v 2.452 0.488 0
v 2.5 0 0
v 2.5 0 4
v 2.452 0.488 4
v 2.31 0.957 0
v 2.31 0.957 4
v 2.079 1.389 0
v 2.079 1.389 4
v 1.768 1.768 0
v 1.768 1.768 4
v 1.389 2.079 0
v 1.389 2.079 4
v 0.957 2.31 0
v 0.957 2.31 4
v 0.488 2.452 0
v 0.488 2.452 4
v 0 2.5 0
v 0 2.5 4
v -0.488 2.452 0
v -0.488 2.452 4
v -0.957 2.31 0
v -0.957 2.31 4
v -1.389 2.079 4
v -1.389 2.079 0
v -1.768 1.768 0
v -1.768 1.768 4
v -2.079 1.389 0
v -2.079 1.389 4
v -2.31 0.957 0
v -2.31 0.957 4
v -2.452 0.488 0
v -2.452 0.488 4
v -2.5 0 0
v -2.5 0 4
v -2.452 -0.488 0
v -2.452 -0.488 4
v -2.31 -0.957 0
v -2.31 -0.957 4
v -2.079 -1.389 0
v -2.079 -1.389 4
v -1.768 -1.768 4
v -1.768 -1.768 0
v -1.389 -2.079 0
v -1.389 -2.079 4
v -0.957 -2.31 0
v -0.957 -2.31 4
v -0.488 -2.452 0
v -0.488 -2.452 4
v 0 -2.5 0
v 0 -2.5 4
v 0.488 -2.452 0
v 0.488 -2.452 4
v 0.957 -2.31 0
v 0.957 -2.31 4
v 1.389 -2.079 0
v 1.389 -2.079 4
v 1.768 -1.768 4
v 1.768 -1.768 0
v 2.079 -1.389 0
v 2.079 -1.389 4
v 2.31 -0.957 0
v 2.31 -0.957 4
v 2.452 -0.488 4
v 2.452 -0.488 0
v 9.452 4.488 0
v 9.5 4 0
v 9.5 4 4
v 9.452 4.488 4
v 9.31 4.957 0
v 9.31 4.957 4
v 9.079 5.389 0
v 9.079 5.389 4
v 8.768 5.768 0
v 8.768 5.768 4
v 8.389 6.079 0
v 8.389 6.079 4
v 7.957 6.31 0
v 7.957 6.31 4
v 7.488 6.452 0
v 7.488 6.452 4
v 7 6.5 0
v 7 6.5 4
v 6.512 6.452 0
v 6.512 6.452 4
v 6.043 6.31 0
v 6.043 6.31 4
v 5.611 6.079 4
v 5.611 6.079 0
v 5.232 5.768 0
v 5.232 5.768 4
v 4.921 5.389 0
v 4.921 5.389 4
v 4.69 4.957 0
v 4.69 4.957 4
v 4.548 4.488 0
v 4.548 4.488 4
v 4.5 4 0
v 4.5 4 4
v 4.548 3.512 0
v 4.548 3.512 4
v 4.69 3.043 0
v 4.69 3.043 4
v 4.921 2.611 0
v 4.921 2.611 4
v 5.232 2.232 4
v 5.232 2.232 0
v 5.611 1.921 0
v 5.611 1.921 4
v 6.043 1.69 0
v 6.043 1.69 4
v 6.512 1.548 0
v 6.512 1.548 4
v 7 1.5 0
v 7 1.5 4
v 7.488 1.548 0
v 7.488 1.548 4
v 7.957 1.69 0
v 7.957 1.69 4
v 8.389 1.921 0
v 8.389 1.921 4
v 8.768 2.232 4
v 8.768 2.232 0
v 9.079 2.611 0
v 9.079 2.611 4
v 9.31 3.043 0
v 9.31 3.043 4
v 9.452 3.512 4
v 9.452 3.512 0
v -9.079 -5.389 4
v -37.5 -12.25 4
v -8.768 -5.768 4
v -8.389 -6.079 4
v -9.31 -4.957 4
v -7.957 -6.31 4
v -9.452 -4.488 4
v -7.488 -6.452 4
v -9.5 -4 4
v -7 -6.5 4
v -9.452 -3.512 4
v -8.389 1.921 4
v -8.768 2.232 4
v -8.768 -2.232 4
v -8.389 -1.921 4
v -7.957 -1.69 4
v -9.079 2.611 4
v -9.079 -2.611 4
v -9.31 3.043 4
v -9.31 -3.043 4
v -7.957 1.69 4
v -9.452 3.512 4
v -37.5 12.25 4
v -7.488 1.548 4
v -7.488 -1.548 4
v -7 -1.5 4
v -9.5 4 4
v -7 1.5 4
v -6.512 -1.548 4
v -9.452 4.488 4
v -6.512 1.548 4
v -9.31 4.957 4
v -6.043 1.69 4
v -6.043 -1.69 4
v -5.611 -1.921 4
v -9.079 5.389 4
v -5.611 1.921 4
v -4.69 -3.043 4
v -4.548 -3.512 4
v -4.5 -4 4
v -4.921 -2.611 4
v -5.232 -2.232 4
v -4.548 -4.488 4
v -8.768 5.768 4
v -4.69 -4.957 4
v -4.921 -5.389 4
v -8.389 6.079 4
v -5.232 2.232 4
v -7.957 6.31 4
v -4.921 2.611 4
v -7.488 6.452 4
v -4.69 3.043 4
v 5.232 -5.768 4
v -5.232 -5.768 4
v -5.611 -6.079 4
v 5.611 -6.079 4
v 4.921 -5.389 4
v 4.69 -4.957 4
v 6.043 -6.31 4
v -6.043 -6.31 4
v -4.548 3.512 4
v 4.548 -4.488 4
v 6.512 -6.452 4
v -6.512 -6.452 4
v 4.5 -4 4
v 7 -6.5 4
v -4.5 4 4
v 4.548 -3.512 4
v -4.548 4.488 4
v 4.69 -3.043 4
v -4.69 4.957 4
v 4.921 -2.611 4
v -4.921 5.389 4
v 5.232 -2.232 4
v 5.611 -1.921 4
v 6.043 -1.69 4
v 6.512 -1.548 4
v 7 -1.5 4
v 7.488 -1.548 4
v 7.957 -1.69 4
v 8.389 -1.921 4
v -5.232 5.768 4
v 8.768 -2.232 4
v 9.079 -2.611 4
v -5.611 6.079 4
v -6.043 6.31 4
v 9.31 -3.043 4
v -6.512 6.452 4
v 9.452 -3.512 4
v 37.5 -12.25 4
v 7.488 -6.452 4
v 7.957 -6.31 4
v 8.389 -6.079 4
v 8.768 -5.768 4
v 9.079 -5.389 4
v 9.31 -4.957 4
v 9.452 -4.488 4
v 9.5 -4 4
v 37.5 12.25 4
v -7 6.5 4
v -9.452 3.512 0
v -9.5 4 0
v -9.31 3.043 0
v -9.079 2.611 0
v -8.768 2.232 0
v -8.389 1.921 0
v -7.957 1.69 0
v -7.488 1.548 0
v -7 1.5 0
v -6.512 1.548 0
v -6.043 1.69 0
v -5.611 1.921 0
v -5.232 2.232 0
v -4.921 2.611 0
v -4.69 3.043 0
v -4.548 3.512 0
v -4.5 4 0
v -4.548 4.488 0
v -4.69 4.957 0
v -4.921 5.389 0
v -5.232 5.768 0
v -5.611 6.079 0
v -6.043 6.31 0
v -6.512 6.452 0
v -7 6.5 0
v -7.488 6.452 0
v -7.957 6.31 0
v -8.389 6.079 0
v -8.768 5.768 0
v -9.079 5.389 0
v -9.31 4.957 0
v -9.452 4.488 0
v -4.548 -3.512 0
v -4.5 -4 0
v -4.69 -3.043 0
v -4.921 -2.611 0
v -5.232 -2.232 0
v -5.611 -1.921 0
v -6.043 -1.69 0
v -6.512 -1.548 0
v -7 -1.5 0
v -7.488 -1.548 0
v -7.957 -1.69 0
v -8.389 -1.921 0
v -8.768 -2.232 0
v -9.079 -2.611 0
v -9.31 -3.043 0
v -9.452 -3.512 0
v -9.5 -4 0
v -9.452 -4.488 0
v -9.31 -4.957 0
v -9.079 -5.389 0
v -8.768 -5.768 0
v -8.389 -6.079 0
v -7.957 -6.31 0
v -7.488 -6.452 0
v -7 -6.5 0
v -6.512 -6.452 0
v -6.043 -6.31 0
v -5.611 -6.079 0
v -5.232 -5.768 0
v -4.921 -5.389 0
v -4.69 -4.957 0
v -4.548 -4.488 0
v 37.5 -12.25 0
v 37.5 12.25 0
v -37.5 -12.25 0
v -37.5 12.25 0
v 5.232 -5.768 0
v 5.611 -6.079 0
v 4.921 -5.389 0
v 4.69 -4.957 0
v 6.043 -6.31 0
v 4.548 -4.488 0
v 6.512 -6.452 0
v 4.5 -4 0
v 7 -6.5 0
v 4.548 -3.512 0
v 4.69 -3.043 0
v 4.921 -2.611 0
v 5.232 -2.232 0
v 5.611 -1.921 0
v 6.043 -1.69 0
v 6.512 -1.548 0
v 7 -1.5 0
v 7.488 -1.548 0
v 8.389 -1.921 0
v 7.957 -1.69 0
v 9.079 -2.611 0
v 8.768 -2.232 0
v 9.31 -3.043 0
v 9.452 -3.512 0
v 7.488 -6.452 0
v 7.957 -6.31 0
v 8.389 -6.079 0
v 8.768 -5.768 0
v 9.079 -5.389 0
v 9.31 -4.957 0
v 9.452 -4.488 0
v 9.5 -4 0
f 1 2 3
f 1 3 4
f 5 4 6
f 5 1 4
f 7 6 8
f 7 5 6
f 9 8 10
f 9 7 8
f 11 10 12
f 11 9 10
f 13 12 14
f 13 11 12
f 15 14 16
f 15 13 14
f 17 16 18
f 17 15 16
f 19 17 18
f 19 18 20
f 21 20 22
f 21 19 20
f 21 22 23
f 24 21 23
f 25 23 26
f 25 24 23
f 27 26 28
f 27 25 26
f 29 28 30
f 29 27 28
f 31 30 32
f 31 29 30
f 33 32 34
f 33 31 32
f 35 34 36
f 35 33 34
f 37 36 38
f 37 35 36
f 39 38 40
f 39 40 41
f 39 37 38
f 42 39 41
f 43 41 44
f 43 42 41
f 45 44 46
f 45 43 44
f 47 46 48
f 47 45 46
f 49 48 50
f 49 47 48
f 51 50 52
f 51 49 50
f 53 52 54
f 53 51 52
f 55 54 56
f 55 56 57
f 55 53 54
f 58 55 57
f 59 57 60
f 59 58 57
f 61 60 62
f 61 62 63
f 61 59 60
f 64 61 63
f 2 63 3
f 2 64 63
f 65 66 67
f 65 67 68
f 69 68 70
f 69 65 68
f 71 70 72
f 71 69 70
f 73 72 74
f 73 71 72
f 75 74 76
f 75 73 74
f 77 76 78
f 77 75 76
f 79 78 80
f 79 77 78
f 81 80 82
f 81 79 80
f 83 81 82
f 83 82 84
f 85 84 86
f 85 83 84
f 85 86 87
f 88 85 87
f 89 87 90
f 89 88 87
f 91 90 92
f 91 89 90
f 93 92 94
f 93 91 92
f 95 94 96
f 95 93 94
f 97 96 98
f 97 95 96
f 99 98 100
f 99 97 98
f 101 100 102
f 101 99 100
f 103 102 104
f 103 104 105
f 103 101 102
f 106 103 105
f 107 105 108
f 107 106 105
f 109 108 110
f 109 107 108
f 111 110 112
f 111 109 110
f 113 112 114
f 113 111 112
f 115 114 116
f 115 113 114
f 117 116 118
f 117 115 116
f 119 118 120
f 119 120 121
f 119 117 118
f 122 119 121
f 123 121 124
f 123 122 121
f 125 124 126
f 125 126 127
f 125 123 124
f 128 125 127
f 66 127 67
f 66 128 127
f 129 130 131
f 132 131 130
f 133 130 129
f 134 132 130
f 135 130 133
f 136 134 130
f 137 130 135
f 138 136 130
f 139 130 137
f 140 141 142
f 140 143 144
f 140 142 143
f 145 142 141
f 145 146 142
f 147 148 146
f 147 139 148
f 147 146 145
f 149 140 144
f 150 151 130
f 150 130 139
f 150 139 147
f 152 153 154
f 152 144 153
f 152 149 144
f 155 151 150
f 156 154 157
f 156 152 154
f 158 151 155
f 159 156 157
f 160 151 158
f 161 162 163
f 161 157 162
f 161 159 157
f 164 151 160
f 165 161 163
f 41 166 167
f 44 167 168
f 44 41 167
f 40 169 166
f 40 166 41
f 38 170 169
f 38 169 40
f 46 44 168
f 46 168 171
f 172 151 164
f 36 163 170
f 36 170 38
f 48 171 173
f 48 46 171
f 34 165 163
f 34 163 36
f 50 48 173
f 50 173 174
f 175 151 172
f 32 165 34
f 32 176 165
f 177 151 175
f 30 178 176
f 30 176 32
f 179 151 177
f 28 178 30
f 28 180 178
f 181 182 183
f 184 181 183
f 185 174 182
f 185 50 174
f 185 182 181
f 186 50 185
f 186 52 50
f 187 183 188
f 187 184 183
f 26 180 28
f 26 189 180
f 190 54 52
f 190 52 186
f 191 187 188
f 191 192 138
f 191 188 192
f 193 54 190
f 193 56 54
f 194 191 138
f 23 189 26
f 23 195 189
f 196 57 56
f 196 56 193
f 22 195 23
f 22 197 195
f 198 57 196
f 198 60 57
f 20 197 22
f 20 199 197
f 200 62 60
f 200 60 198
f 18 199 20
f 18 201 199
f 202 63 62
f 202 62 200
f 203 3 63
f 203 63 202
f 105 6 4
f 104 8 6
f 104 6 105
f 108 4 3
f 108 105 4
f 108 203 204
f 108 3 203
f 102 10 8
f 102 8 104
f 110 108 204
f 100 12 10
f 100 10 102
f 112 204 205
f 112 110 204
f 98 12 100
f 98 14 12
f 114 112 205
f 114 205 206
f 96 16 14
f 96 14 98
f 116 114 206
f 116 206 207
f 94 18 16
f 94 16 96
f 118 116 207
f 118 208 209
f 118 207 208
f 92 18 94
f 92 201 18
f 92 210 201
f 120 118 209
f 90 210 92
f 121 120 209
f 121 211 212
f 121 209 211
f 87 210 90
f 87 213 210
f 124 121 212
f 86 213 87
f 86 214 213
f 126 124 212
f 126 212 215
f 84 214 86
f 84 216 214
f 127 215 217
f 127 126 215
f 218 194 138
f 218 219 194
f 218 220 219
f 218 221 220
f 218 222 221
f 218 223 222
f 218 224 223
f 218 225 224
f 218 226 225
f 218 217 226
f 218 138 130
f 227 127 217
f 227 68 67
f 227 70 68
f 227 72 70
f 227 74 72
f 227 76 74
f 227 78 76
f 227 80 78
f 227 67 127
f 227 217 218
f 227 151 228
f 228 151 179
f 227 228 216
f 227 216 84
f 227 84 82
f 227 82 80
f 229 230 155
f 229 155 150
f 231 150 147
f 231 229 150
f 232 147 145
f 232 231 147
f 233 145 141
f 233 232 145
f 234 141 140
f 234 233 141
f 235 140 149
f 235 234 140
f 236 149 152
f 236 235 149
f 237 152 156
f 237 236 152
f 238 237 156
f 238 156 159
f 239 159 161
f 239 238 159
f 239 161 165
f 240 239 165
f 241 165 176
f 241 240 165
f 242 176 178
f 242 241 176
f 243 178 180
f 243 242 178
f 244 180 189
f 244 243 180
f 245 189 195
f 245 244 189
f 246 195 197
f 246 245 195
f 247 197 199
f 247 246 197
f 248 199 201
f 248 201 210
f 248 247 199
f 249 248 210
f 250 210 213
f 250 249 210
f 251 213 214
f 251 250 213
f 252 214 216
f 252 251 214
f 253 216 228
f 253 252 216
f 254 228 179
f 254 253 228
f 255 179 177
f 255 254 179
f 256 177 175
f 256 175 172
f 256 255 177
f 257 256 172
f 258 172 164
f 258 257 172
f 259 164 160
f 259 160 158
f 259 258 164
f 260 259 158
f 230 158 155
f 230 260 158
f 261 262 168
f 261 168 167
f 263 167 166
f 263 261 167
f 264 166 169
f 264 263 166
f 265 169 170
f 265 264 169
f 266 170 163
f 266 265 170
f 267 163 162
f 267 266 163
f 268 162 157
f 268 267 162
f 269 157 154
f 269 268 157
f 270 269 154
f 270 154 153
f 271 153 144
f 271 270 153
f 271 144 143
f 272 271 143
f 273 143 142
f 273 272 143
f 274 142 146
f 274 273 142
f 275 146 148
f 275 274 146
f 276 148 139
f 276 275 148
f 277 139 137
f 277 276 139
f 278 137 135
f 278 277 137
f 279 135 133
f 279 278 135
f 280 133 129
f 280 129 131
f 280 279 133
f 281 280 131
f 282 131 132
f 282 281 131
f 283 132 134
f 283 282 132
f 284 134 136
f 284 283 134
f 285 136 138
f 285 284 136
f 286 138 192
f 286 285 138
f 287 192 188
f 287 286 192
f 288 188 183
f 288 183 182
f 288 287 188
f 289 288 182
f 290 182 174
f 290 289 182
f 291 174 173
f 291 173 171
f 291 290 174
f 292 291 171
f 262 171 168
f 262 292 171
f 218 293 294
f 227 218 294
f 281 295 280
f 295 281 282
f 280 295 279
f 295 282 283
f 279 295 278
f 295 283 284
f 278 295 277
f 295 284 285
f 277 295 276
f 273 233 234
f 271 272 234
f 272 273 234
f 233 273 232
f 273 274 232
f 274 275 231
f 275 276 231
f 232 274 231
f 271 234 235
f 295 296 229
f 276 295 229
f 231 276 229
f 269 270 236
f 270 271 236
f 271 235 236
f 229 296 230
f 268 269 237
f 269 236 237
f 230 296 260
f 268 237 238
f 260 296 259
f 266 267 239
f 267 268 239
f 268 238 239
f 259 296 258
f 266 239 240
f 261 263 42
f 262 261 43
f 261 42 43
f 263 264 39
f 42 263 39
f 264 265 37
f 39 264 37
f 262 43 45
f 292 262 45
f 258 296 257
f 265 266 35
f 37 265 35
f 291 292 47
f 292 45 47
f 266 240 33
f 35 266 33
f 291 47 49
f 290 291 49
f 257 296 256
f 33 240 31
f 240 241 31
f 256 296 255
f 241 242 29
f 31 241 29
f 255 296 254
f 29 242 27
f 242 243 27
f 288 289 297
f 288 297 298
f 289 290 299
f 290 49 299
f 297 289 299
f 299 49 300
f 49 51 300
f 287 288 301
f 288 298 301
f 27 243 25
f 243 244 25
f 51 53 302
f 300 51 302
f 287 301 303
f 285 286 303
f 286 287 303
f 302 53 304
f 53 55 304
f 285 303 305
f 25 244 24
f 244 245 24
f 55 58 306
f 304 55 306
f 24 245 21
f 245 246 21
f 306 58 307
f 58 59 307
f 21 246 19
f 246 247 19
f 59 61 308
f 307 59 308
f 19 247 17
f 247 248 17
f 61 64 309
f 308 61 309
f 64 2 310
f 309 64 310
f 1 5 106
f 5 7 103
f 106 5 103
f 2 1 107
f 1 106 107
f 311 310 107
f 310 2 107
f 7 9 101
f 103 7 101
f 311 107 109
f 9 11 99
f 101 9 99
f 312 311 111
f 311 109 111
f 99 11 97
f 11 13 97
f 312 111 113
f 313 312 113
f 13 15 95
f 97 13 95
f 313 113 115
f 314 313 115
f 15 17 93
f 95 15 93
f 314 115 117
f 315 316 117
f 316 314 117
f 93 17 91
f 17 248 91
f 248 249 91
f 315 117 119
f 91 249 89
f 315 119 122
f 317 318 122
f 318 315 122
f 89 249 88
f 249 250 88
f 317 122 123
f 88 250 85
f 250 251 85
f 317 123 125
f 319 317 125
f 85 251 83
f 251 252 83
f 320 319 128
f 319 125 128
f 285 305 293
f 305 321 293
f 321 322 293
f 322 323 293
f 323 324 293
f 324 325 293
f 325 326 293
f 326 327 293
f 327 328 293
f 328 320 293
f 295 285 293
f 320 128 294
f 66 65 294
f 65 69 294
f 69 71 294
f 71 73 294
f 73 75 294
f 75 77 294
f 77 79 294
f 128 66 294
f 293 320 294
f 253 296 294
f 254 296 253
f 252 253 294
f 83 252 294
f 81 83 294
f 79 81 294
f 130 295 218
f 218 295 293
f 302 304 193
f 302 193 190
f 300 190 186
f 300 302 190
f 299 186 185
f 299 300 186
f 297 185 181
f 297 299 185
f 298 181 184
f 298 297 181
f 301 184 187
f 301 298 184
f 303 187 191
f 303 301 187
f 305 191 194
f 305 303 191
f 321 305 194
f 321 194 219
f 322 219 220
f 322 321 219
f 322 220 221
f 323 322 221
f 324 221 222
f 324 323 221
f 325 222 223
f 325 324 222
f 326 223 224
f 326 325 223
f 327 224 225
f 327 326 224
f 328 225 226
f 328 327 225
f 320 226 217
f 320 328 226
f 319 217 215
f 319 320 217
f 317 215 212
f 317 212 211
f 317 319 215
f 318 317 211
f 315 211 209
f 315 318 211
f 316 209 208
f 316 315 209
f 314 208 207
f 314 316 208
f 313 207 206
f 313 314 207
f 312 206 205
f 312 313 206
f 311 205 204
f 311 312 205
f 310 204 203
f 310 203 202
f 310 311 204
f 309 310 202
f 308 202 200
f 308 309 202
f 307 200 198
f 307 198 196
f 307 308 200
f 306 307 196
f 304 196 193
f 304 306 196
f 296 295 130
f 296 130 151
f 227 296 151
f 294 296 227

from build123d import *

# Parameters (mm, degrees)
CROQUIS1_W              = 75
CROQUIS1_H              = 24.5
CROQUIS1_R              = 2.5
SALIENTE_EXTRUIR1_DEPTH = 4


with BuildPart() as part:
    # Croquis1 → Saliente-Extruir1 (new body)
    with BuildSketch(Plane.XY):
        Rectangle(CROQUIS1_W, CROQUIS1_H)
        Circle(CROQUIS1_R, mode=Mode.SUBTRACT)
        with Locations((7, 4)):
            Circle(CROQUIS1_R, mode=Mode.SUBTRACT)
        with Locations(Location((7, -4, 0), (0, 0, 180))):
            Circle(CROQUIS1_R, mode=Mode.SUBTRACT)
        with Locations((-7, -4)):
            Circle(CROQUIS1_R, mode=Mode.SUBTRACT)
        with Locations(Location((-7, 4, 0), (0, 0, 180))):
            Circle(CROQUIS1_R, mode=Mode.SUBTRACT)
    extrude(amount=SALIENTE_EXTRUIR1_DEPTH)


solid = part.part
